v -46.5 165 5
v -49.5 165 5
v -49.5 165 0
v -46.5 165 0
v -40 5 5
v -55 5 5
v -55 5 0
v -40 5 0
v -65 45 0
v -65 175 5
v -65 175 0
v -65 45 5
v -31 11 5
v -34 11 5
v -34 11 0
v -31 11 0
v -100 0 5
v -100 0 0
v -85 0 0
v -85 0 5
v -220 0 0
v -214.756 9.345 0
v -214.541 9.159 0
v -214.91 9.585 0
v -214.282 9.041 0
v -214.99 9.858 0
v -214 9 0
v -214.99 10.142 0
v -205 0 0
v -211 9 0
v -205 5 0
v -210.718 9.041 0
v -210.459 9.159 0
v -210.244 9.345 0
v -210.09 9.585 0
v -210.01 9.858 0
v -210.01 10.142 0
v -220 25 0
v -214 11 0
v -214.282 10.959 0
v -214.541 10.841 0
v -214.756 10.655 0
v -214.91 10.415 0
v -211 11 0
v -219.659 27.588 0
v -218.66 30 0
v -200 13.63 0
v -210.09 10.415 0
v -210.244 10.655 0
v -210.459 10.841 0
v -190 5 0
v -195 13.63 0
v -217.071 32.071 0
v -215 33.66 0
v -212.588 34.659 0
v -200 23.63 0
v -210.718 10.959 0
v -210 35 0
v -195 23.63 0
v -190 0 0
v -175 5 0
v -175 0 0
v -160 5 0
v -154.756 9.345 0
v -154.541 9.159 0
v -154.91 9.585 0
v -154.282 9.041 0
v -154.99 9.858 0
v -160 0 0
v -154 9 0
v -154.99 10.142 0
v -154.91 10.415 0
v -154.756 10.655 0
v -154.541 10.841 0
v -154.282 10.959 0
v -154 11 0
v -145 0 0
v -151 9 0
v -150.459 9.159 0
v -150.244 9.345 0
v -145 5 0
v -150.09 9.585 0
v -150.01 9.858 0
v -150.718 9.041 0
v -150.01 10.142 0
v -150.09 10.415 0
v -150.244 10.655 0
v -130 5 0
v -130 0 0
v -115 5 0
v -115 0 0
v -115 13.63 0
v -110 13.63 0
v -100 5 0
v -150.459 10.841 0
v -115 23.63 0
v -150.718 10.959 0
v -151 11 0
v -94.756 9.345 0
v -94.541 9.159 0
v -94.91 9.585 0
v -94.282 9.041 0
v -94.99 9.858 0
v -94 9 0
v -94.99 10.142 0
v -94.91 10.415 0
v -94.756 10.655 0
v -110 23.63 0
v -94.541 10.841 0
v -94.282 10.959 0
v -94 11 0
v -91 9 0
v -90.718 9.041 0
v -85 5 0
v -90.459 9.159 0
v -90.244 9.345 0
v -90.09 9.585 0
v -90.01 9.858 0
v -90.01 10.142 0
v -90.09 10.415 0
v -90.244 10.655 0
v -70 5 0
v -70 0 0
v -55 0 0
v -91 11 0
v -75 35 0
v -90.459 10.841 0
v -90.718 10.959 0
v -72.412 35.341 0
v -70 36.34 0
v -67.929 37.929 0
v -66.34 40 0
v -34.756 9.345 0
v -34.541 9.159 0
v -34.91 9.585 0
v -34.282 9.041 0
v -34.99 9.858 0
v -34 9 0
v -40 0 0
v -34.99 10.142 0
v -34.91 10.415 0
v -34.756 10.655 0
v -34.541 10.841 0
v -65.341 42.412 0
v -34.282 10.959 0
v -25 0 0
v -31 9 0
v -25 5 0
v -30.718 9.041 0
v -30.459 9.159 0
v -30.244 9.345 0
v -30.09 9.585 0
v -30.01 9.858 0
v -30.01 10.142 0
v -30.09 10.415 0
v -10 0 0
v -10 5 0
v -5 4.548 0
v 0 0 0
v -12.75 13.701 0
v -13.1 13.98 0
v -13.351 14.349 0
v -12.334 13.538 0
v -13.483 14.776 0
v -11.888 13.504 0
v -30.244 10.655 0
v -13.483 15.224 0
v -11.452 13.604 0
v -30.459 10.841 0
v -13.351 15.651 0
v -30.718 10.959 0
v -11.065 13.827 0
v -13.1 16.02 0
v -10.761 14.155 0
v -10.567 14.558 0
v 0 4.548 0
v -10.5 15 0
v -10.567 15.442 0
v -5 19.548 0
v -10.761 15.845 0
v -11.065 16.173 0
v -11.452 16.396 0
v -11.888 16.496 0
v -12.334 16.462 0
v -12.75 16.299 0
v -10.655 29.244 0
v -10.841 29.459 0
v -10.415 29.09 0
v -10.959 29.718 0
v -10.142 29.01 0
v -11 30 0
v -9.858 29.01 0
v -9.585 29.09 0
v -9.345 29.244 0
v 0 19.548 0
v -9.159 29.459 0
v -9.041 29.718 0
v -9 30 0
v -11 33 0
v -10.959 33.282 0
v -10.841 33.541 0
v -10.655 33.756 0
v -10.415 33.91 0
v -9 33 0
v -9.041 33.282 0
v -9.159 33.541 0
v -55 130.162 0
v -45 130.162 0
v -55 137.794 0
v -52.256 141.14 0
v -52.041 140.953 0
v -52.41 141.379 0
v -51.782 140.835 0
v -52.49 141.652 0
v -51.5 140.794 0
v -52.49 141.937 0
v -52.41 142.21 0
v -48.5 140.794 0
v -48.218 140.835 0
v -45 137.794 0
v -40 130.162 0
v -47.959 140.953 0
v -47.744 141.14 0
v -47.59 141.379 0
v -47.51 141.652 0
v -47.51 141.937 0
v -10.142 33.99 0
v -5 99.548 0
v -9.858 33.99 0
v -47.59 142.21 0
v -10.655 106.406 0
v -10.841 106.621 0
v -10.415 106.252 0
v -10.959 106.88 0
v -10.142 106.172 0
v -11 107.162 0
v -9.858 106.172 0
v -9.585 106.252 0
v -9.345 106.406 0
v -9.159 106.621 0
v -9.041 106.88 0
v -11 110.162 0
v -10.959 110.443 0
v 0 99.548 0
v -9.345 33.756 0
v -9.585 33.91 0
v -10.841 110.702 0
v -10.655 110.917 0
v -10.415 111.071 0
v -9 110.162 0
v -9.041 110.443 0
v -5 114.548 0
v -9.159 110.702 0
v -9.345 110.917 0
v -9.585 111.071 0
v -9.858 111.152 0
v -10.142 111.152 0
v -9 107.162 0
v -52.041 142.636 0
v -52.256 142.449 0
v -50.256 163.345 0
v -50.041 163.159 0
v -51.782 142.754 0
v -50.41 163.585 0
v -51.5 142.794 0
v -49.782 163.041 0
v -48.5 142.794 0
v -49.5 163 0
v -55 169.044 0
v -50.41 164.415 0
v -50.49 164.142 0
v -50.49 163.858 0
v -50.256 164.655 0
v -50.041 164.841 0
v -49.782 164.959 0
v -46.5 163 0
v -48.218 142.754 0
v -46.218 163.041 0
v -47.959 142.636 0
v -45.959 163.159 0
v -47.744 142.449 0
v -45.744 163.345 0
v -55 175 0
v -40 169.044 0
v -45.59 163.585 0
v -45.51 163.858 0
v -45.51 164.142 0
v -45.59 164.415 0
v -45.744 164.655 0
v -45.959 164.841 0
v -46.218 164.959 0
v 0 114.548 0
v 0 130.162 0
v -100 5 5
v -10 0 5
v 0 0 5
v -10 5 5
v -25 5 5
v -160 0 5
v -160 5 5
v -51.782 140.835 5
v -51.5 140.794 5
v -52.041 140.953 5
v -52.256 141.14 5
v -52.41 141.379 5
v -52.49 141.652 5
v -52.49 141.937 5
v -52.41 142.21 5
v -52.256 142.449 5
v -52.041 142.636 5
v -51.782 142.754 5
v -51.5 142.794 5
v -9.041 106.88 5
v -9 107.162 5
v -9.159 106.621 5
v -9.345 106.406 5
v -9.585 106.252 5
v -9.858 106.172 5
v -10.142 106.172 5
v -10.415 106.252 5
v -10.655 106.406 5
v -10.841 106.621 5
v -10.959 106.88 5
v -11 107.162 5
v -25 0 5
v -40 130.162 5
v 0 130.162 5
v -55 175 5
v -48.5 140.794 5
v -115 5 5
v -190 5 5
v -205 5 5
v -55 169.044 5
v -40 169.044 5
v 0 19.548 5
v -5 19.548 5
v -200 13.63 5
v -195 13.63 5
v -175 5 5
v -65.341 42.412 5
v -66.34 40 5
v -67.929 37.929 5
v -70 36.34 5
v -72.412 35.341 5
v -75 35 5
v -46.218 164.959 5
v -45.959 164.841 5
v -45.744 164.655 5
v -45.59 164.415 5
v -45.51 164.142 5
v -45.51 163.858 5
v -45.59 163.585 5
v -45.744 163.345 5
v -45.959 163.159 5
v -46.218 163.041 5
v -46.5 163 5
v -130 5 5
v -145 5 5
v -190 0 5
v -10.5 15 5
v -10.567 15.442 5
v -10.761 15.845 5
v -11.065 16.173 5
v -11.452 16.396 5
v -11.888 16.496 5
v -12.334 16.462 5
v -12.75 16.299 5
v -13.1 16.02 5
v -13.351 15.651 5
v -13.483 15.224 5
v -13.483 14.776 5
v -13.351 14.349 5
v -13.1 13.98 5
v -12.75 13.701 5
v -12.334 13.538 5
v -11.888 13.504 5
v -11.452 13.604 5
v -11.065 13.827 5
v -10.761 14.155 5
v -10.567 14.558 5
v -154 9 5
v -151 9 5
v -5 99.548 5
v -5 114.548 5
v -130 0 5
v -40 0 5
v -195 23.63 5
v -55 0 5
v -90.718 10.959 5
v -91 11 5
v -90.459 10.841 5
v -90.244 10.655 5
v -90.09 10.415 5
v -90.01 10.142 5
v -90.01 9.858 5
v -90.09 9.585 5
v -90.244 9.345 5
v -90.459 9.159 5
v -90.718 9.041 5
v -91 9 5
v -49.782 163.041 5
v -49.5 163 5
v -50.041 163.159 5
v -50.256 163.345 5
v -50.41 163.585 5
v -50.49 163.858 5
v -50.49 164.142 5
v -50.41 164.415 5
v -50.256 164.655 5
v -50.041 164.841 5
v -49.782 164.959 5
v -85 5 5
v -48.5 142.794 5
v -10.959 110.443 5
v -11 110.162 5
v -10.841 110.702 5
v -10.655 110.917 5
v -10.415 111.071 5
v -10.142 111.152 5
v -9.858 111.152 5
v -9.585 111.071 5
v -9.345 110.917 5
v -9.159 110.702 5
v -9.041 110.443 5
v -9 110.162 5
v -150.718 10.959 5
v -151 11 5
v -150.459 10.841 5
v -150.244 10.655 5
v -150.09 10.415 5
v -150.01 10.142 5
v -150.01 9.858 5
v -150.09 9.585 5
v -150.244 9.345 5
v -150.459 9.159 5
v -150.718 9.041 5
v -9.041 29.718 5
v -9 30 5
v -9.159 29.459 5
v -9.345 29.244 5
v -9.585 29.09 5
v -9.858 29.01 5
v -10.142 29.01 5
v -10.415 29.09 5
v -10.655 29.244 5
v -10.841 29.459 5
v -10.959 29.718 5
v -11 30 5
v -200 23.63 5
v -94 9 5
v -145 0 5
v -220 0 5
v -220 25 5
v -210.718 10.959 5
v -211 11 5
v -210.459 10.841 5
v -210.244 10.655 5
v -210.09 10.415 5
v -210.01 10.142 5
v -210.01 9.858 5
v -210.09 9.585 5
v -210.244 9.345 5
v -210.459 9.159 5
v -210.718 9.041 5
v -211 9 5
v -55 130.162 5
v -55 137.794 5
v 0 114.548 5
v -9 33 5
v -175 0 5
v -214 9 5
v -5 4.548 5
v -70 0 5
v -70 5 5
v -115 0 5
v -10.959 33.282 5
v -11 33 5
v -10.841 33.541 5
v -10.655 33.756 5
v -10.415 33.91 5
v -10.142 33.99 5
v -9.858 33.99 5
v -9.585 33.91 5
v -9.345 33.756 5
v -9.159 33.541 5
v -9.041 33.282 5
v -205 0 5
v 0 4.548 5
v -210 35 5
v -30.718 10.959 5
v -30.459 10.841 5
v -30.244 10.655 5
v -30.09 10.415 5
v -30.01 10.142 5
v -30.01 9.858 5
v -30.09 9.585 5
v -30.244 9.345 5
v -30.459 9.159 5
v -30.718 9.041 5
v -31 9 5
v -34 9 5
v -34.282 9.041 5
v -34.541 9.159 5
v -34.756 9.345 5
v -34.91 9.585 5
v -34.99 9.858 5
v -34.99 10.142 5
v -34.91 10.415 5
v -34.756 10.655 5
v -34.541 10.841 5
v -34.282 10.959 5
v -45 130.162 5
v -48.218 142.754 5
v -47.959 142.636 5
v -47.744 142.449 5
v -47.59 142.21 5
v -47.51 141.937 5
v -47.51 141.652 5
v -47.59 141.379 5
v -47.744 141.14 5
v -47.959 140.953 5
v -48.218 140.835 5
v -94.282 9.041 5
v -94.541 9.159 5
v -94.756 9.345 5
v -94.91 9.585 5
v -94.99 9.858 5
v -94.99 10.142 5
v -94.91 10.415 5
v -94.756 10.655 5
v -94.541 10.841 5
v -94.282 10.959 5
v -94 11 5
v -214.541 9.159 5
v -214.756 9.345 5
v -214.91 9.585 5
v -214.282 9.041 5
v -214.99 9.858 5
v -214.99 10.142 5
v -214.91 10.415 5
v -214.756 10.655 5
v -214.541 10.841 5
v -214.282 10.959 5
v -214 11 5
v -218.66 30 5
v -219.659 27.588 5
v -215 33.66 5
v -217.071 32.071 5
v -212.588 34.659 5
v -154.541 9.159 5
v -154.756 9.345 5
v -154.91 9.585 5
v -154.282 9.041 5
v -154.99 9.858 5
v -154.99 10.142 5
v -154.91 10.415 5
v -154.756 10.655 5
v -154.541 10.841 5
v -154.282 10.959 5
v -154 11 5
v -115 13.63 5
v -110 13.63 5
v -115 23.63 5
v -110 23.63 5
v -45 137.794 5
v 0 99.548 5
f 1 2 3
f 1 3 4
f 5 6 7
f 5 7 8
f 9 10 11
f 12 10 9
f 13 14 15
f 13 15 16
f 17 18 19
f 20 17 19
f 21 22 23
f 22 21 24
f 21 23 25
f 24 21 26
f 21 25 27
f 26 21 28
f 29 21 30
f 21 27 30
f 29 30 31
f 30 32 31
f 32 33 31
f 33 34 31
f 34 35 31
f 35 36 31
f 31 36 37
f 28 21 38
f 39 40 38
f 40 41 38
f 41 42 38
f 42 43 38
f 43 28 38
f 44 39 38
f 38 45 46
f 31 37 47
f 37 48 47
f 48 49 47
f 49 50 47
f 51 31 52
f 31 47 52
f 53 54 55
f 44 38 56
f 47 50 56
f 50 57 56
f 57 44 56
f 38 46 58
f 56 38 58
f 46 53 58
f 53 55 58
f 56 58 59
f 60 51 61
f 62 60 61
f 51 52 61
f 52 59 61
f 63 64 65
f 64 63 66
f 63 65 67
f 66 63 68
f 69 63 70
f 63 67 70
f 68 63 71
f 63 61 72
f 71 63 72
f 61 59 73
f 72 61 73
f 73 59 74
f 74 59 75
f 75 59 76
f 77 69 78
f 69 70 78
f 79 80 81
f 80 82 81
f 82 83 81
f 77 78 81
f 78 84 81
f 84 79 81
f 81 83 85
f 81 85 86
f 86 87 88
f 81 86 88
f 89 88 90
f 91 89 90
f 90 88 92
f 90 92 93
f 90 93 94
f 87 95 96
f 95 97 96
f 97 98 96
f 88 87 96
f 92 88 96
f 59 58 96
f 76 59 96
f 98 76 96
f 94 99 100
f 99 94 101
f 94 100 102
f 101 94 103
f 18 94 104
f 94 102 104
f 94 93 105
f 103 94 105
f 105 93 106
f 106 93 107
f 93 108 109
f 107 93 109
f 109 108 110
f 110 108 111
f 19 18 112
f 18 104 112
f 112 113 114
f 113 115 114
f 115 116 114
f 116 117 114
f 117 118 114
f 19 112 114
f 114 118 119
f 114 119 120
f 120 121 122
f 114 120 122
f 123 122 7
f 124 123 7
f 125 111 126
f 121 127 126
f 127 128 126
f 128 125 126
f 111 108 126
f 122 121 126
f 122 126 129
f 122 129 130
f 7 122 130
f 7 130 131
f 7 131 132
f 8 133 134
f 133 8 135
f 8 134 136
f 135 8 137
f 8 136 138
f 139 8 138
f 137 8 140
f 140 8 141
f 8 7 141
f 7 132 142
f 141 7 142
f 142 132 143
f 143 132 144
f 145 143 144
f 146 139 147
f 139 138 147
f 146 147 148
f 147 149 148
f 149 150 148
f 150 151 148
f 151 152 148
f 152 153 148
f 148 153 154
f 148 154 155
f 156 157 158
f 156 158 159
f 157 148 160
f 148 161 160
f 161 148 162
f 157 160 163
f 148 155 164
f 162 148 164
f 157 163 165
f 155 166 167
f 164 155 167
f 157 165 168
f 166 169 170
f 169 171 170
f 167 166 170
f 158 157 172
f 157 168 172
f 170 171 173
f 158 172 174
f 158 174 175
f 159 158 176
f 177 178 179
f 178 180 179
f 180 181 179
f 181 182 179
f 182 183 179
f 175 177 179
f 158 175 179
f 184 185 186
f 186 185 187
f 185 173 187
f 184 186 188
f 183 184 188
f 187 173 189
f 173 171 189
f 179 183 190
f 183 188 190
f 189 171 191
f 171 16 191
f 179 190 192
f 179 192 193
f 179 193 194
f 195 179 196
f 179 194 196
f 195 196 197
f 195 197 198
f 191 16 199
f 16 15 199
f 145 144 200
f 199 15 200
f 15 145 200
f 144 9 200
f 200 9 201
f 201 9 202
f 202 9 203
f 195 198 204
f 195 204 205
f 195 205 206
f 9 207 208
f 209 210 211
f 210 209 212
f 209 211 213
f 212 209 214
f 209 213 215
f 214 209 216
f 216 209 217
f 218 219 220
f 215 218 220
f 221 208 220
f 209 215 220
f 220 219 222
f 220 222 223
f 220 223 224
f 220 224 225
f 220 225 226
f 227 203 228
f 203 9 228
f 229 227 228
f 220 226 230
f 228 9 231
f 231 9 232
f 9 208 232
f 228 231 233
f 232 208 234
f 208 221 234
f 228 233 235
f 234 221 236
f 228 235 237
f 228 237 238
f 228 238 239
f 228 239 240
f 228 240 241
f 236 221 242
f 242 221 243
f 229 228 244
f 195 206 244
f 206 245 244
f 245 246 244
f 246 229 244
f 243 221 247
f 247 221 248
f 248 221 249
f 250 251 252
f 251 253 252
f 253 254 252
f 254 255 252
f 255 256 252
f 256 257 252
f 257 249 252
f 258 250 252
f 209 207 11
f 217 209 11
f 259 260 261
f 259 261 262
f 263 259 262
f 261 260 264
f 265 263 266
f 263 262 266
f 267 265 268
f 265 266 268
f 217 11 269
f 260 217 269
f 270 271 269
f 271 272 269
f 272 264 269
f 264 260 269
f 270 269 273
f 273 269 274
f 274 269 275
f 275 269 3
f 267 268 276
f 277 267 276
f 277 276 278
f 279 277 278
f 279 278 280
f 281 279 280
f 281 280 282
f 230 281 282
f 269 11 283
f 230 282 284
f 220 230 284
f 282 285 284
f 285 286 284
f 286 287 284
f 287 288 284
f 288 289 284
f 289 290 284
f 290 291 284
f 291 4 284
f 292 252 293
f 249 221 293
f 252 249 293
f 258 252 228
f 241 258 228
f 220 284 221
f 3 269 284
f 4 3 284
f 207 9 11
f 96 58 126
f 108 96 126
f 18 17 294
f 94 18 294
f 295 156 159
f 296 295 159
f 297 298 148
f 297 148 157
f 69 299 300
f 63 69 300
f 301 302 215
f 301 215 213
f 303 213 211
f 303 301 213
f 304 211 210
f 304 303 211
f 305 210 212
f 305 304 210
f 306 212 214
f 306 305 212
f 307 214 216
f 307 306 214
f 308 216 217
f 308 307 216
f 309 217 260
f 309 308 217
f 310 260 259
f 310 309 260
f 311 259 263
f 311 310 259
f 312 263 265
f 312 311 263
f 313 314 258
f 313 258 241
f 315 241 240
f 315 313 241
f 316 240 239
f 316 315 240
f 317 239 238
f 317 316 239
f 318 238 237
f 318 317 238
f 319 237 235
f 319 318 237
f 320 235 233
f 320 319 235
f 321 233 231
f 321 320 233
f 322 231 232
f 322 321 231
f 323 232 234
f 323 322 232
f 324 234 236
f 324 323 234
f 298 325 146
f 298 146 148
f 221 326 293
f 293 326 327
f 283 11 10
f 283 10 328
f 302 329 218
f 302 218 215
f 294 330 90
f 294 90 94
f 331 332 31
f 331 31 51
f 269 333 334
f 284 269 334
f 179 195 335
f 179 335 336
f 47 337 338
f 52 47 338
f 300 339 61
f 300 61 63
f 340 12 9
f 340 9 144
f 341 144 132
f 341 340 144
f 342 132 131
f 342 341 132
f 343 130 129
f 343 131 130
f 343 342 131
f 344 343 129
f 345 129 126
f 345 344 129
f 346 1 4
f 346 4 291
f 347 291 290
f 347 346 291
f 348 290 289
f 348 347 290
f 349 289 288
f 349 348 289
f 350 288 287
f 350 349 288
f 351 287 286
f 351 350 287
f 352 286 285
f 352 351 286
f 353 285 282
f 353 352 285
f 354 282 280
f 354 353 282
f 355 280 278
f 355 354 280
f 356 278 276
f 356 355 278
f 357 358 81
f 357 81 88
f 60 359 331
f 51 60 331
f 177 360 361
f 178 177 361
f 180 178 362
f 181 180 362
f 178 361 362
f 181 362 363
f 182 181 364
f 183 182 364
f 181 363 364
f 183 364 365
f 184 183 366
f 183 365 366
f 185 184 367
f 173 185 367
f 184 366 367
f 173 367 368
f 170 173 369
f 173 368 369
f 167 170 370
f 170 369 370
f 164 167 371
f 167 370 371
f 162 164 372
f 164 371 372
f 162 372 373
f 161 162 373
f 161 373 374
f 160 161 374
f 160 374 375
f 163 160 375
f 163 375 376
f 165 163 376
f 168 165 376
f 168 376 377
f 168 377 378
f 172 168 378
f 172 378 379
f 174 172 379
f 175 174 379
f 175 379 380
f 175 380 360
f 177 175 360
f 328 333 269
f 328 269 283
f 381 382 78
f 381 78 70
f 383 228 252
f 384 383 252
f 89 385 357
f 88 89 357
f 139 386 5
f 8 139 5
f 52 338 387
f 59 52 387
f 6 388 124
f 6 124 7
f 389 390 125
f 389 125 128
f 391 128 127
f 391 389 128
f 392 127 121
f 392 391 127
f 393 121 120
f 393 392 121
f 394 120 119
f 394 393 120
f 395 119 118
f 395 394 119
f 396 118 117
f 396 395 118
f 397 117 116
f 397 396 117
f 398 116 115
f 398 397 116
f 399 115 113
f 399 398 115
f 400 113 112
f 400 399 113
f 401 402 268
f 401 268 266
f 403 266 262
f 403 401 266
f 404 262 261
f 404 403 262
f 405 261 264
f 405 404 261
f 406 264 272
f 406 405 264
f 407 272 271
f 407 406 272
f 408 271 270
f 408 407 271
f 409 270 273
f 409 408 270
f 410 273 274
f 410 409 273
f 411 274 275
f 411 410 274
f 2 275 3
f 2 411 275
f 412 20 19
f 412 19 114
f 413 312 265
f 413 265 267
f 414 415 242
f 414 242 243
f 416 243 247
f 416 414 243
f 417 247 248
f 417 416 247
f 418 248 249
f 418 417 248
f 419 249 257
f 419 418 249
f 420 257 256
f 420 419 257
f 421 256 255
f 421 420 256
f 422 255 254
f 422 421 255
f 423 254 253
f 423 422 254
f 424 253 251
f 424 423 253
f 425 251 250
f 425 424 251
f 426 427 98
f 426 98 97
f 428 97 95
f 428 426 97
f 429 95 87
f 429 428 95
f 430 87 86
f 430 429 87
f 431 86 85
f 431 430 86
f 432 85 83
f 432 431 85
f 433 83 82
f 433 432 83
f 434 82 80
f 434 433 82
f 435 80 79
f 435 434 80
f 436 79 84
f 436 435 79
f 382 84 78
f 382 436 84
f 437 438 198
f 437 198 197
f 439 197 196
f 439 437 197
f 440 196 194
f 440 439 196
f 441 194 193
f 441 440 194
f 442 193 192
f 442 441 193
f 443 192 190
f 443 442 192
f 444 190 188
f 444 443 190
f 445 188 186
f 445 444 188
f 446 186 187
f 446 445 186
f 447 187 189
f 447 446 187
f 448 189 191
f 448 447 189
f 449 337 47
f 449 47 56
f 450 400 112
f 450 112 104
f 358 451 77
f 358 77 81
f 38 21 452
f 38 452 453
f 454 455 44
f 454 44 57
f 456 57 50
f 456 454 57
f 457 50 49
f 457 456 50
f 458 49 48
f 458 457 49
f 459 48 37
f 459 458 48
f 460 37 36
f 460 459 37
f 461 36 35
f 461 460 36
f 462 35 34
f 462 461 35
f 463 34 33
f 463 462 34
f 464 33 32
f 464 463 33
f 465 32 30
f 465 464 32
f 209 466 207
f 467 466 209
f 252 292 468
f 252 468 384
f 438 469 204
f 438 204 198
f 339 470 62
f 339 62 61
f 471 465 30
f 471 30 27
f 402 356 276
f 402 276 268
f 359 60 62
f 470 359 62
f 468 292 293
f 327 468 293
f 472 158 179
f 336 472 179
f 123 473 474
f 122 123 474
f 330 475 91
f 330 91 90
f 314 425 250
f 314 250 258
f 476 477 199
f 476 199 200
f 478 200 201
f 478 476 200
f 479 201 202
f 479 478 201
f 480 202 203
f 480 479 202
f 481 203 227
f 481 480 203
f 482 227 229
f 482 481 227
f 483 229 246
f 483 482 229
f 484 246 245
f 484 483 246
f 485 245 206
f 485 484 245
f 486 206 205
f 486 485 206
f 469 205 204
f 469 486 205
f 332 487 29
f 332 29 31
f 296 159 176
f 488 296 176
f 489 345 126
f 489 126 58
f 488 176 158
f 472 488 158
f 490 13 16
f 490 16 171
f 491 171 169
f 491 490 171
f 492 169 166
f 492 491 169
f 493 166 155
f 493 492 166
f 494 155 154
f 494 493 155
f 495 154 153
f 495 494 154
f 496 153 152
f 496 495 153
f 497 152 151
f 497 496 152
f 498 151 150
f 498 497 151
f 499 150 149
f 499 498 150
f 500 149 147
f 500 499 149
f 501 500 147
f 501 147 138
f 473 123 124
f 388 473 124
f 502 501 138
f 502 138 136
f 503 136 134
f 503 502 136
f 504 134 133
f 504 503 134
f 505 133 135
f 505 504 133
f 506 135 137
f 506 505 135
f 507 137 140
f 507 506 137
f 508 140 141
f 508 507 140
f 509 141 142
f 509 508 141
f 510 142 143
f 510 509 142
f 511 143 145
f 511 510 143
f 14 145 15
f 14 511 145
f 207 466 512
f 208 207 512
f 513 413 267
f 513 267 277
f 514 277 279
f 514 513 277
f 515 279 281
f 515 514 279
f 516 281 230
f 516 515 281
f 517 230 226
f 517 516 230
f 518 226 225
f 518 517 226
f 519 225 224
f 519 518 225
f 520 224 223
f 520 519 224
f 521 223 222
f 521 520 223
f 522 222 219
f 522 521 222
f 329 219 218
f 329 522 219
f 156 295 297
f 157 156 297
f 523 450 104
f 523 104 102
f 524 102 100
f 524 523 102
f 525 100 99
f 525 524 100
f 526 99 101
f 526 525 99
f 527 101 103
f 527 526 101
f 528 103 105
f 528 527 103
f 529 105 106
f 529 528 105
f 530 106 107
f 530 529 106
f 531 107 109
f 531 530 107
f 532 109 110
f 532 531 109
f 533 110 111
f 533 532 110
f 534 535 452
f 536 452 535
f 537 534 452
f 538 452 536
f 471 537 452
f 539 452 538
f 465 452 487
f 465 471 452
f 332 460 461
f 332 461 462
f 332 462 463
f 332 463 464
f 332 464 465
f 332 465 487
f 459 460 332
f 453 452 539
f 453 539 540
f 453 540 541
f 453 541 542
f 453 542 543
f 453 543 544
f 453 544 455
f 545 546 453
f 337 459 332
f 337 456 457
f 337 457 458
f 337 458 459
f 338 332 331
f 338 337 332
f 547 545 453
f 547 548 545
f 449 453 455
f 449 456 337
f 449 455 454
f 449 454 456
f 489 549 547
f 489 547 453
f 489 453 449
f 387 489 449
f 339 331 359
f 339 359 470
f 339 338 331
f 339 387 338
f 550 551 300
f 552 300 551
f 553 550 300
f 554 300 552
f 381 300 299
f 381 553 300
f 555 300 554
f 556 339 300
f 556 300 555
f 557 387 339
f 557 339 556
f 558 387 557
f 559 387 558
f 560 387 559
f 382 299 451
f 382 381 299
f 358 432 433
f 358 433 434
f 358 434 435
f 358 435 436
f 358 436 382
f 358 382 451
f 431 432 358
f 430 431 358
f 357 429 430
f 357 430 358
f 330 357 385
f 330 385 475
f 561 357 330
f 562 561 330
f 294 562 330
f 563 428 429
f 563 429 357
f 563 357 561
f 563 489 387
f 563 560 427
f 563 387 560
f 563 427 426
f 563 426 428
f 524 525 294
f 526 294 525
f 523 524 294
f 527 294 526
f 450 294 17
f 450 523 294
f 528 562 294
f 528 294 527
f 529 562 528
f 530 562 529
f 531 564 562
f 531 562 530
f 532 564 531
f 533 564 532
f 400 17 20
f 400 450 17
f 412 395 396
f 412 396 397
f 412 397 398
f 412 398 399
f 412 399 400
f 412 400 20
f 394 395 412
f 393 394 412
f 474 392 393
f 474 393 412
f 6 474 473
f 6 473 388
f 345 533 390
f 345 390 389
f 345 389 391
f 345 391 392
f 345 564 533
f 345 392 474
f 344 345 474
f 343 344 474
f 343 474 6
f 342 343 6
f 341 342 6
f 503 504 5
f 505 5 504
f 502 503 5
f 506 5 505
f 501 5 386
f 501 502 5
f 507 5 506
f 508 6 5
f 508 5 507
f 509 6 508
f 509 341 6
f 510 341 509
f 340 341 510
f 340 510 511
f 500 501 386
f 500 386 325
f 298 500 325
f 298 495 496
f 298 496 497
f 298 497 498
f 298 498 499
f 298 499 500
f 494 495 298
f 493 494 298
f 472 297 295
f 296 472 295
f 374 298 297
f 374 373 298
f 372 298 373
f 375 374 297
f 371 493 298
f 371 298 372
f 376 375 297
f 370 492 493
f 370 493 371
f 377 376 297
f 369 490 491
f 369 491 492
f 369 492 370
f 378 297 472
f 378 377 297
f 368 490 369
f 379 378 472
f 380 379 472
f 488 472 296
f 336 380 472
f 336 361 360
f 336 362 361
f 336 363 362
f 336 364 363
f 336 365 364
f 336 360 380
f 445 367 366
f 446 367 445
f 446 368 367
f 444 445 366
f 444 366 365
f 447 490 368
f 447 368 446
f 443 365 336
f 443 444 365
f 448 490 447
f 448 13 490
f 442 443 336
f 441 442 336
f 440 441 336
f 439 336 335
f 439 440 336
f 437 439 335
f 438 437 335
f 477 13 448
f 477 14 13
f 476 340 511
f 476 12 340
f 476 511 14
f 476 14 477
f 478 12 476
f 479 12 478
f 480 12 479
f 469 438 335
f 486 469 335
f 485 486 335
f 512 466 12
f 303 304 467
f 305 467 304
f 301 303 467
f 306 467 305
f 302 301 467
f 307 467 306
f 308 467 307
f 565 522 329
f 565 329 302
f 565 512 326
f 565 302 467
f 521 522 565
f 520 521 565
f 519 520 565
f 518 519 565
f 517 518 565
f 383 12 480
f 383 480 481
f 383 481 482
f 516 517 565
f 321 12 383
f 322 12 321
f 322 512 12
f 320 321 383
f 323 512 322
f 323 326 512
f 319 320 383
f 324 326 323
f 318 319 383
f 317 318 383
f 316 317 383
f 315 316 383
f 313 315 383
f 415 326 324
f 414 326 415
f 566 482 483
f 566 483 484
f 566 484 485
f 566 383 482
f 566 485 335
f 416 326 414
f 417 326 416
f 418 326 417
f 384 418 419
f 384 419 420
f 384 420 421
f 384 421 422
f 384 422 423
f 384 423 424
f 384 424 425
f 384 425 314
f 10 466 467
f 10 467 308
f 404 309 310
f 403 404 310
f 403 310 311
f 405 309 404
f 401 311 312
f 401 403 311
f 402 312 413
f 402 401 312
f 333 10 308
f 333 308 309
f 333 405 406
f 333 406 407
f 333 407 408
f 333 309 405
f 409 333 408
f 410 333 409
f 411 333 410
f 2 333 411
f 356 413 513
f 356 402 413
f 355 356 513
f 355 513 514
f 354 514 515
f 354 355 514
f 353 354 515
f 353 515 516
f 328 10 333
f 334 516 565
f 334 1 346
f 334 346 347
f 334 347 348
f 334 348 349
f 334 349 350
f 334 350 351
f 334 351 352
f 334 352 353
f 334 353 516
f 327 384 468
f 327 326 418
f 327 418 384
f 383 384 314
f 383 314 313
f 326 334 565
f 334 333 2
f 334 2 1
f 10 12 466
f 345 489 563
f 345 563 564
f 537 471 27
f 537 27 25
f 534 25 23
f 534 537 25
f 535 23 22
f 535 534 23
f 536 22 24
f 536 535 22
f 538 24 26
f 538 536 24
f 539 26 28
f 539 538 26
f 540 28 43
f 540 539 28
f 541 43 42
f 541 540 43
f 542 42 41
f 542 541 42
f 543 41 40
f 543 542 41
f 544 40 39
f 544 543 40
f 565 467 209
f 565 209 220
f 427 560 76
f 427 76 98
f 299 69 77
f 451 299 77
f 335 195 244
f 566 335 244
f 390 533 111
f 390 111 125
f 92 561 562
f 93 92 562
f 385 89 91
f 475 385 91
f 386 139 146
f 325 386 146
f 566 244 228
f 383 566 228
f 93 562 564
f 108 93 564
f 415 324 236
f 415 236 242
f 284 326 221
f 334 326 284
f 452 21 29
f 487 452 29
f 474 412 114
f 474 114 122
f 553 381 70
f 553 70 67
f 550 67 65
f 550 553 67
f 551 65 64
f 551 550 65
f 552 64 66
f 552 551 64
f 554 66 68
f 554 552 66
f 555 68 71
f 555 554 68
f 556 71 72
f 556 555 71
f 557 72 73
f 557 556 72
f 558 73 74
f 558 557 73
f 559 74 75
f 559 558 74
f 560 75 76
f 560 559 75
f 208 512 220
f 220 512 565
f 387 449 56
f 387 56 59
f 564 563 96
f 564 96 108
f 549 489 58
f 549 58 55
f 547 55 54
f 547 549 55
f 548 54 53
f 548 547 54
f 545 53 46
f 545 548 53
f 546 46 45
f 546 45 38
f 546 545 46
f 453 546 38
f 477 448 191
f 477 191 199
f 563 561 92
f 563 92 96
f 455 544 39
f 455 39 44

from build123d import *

# Parameters (mm, degrees)
SKETCH1_W           = 220
SKETCH1_H           = 175
BOSS_EXTRUDE1_DEPTH = 5
SKETCH2_W           = 15
SKETCH2_H           = 5
CUT_EXTRUDE1_DEPTH  = 282.15831839
LPATTERN1_COUNT     = 7
LPATTERN1_PITCH     = 30
SKETCH3_W           = 15
SKETCH3_H           = 5.956499639
CUT_EXTRUDE2_DEPTH  = 282.15831839
LPATTERN2_COUNT     = 7
LPATTERN2_PITCH     = 30
SKETCH4_R           = 1.5
CUT_EXTRUDE3_DEPTH  = 282.15831839
SKETCH5_W           = 5
SKETCH5_H           = 15
CUT_EXTRUDE4_DEPTH  = 282.15831839
SKETCH7_W           = 40
SKETCH7_H           = 44.8382835
SKETCH7_W_2         = 10
SKETCH7_H_2         = 7.632708493
CUT_EXTRUDE6_DEPTH  = 282.15831839
SKETCH8_W           = 5
SKETCH8_H           = 10
CUT_EXTRUDE7_DEPTH  = 282.15831839
CUT_EXTRUDE8_DEPTH  = 282.15831839


with BuildPart() as part:
    # Sketch1 → Boss-Extrude1 (new body)
    with BuildSketch(Plane.XY):
        with Locations((-110, 87.5)):
            Rectangle(SKETCH1_W, SKETCH1_H)
    extrude(amount=BOSS_EXTRUDE1_DEPTH)

    # Sketch2 → Cut-Extrude1 (cut, through all)
    with BuildSketch(Plane.XY.offset(5)):
        with Locations((-197.5, 2.5)):
            Rectangle(SKETCH2_W, SKETCH2_H)
    cut_extrude1 = extrude(amount=-CUT_EXTRUDE1_DEPTH, mode=Mode.SUBTRACT)

    # LPattern1: Cut-Extrude1 ×7
    with Locations(*[(i * LPATTERN1_PITCH, 0, 0) for i in range(1, LPATTERN1_COUNT)]):
        add(cut_extrude1, mode=Mode.SUBTRACT)

    # Sketch3 → Cut-Extrude2 (cut, through all)
    with BuildSketch(Plane.XY.offset(5)):
        with Locations((-197.5, 172.021750181)):
            Rectangle(SKETCH3_W, SKETCH3_H)
    cut_extrude2 = extrude(amount=-CUT_EXTRUDE2_DEPTH, mode=Mode.SUBTRACT)

    # LPattern2: Cut-Extrude2 ×7
    with Locations(*[(i * LPATTERN2_PITCH, 0, 0) for i in range(1, LPATTERN2_COUNT)]):
        add(cut_extrude2, mode=Mode.SUBTRACT)

    # Sketch4 → Cut-Extrude3 (cut, through all)
    with BuildSketch(Plane.XY.offset(5)):
        with Locations((-12, 15)):
            Circle(SKETCH4_R)
    extrude(amount=-CUT_EXTRUDE3_DEPTH, mode=Mode.SUBTRACT)

    # Sketch5 → Cut-Extrude4 (cut, through all)
    with BuildSketch(Plane(origin=(0, 0, 0), x_dir=(-1, 0, 0), z_dir=(0, 0, -1))):
        with Locations((2.5, 107.048065362)):
            Rectangle(SKETCH5_W, SKETCH5_H)
        with Locations((2.5, 12.048065362)):
            Rectangle(SKETCH5_W, SKETCH5_H)
    extrude(amount=-CUT_EXTRUDE4_DEPTH, mode=Mode.SUBTRACT)

    # Sketch7 → Cut-Extrude6 (cut, through all)
    with BuildSketch(Plane.XY.offset(5)):
        with Locations((-20, 152.58085825)):
            Rectangle(SKETCH7_W, SKETCH7_H)
        with Locations((-50, 133.978070747)):
            Rectangle(SKETCH7_W_2, SKETCH7_H_2)
    extrude(amount=-CUT_EXTRUDE6_DEPTH, mode=Mode.SUBTRACT)

    # Sketch8 → Cut-Extrude7 (cut, through all)
    with BuildSketch(Plane.XY.offset(5)):
        with BuildLine():
            Line((-220, 175), (-65, 175))
            Line((-65, 175), (-65, 45))
            ThreePointArc((-65, 45), (-67.928932188, 37.928932188), (-75, 35))
            Line((-75, 35), (-210, 35))
            ThreePointArc((-210, 35), (-217.071067812, 32.071067812), (-220, 25))
            Line((-220, 25), (-220, 175))
        make_face()
        with Locations((-197.5, 18.629836595)):
            Rectangle(SKETCH8_W, SKETCH8_H)
        with Locations((-112.5, 18.629836595)):
            Rectangle(SKETCH8_W, SKETCH8_H)
    extrude(amount=-CUT_EXTRUDE7_DEPTH, mode=Mode.SUBTRACT)

    # Sketch9 → Cut-Extrude8 (cut, through all)
    with BuildSketch(Plane.XY.offset(5)):
        with BuildLine():
            Line((-214, 11), (-211, 11))
            ThreePointArc((-211, 11), (-210, 10), (-211, 9))
            Line((-211, 9), (-214, 9))
            ThreePointArc((-214, 9), (-215, 10), (-214, 11))
        make_face()
        with BuildLine():
            Line((-154, 11), (-151, 11))
            ThreePointArc((-151, 11), (-150, 10), (-151, 9))
            Line((-151, 9), (-154, 9))
            ThreePointArc((-154, 9), (-155, 10), (-154, 11))
        make_face()
        with BuildLine():
            Line((-94, 11), (-91, 11))
            ThreePointArc((-91, 11), (-90, 10), (-91, 9))
            Line((-91, 9), (-94, 9))
            ThreePointArc((-94, 9), (-95, 10), (-94, 11))
        make_face()
        with BuildLine():
            Line((-34, 11), (-31, 11))
            ThreePointArc((-31, 11), (-30, 10), (-31, 9))
            Line((-31, 9), (-34, 9))
            ThreePointArc((-34, 9), (-35, 10), (-34, 11))
        make_face()
        with BuildLine():
            Line((-11, 30), (-11, 33))
            ThreePointArc((-11, 33), (-10, 34), (-9, 33))
            Line((-9, 33), (-9, 30))
            ThreePointArc((-9, 30), (-10, 29), (-11, 30))
        make_face()
        with BuildLine():
            Line((-11, 107.1617165), (-11, 110.1617165))
            ThreePointArc((-11, 110.1617165), (-10, 111.1617165), (-9, 110.1617165))
            Line((-9, 110.1617165), (-9, 107.1617165))
            ThreePointArc((-9, 107.1617165), (-10, 106.1617165), (-11, 107.1617165))
        make_face()
        with BuildLine():
            Line((-51.5, 142.794424993), (-48.5, 142.794424993))
            ThreePointArc((-48.5, 142.794424993), (-47.5, 141.794424993), (-48.5, 140.794424993))
            Line((-48.5, 140.794424993), (-51.5, 140.794424993))
            ThreePointArc((-51.5, 140.794424993), (-52.5, 141.794424993), (-51.5, 142.794424993))
        make_face()
        with BuildLine():
            Line((-49.5, 165), (-46.5, 165))
            ThreePointArc((-46.5, 165), (-45.5, 164), (-46.5, 163))
            Line((-46.5, 163), (-49.5, 163))
            ThreePointArc((-49.5, 163), (-50.5, 164), (-49.5, 165))
        make_face()
        with BuildLine():
            Line((-51.5, 134.1617165), (-48.5, 134.1617165))
            ThreePointArc((-48.5, 134.1617165), (-47.5, 133.1617165), (-48.5, 132.1617165))
            Line((-48.5, 132.1617165), (-51.5, 132.1617165))
            ThreePointArc((-51.5, 132.1617165), (-52.5, 133.1617165), (-51.5, 134.1617165))
        make_face()
    extrude(amount=-CUT_EXTRUDE8_DEPTH, mode=Mode.SUBTRACT)


solid = part.part
